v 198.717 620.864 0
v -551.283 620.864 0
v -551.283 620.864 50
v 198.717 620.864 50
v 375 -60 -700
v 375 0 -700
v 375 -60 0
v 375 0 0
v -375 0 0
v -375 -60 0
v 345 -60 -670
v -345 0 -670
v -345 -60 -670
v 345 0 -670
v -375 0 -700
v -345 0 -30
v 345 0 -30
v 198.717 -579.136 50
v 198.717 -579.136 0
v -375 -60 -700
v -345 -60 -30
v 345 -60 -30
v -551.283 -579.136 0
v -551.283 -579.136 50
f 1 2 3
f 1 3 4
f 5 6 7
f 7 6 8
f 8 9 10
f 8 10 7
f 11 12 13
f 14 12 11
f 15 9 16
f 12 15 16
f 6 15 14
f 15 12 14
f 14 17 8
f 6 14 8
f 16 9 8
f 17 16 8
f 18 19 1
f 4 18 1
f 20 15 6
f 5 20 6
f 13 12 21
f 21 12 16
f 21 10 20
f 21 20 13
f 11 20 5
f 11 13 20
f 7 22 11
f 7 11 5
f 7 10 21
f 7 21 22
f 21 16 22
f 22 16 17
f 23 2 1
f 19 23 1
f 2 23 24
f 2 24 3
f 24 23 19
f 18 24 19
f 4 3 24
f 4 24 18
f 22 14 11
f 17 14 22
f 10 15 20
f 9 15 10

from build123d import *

# Parameters (mm, degrees)
F0_W     = 750
F0_H     = 700
F0_W_2   = 690
F0_H_2   = 640
F1_DEPTH = 60
F2_W     = 750
F2_H     = 1200
F3_DEPTH = 50


with BuildPart() as f1:
    # F0 (on Front) → F1 (new body)
    with BuildSketch(Plane.XZ):
        with Locations((0, -350)):
            Rectangle(F0_W, F0_H)
        with Locations((0, -350)):
            Rectangle(F0_W_2, F0_H_2, mode=Mode.SUBTRACT)
    extrude(amount=F1_DEPTH)


with BuildPart() as f3:
    # F2 (on Top) → F3 (new body)
    with BuildSketch(Plane.XY):
        with Locations((-176.282793, 20.86416)):
            Rectangle(F2_W, F2_H)
    extrude(amount=F3_DEPTH)


solid = Compound([f1.part, f3.part])
